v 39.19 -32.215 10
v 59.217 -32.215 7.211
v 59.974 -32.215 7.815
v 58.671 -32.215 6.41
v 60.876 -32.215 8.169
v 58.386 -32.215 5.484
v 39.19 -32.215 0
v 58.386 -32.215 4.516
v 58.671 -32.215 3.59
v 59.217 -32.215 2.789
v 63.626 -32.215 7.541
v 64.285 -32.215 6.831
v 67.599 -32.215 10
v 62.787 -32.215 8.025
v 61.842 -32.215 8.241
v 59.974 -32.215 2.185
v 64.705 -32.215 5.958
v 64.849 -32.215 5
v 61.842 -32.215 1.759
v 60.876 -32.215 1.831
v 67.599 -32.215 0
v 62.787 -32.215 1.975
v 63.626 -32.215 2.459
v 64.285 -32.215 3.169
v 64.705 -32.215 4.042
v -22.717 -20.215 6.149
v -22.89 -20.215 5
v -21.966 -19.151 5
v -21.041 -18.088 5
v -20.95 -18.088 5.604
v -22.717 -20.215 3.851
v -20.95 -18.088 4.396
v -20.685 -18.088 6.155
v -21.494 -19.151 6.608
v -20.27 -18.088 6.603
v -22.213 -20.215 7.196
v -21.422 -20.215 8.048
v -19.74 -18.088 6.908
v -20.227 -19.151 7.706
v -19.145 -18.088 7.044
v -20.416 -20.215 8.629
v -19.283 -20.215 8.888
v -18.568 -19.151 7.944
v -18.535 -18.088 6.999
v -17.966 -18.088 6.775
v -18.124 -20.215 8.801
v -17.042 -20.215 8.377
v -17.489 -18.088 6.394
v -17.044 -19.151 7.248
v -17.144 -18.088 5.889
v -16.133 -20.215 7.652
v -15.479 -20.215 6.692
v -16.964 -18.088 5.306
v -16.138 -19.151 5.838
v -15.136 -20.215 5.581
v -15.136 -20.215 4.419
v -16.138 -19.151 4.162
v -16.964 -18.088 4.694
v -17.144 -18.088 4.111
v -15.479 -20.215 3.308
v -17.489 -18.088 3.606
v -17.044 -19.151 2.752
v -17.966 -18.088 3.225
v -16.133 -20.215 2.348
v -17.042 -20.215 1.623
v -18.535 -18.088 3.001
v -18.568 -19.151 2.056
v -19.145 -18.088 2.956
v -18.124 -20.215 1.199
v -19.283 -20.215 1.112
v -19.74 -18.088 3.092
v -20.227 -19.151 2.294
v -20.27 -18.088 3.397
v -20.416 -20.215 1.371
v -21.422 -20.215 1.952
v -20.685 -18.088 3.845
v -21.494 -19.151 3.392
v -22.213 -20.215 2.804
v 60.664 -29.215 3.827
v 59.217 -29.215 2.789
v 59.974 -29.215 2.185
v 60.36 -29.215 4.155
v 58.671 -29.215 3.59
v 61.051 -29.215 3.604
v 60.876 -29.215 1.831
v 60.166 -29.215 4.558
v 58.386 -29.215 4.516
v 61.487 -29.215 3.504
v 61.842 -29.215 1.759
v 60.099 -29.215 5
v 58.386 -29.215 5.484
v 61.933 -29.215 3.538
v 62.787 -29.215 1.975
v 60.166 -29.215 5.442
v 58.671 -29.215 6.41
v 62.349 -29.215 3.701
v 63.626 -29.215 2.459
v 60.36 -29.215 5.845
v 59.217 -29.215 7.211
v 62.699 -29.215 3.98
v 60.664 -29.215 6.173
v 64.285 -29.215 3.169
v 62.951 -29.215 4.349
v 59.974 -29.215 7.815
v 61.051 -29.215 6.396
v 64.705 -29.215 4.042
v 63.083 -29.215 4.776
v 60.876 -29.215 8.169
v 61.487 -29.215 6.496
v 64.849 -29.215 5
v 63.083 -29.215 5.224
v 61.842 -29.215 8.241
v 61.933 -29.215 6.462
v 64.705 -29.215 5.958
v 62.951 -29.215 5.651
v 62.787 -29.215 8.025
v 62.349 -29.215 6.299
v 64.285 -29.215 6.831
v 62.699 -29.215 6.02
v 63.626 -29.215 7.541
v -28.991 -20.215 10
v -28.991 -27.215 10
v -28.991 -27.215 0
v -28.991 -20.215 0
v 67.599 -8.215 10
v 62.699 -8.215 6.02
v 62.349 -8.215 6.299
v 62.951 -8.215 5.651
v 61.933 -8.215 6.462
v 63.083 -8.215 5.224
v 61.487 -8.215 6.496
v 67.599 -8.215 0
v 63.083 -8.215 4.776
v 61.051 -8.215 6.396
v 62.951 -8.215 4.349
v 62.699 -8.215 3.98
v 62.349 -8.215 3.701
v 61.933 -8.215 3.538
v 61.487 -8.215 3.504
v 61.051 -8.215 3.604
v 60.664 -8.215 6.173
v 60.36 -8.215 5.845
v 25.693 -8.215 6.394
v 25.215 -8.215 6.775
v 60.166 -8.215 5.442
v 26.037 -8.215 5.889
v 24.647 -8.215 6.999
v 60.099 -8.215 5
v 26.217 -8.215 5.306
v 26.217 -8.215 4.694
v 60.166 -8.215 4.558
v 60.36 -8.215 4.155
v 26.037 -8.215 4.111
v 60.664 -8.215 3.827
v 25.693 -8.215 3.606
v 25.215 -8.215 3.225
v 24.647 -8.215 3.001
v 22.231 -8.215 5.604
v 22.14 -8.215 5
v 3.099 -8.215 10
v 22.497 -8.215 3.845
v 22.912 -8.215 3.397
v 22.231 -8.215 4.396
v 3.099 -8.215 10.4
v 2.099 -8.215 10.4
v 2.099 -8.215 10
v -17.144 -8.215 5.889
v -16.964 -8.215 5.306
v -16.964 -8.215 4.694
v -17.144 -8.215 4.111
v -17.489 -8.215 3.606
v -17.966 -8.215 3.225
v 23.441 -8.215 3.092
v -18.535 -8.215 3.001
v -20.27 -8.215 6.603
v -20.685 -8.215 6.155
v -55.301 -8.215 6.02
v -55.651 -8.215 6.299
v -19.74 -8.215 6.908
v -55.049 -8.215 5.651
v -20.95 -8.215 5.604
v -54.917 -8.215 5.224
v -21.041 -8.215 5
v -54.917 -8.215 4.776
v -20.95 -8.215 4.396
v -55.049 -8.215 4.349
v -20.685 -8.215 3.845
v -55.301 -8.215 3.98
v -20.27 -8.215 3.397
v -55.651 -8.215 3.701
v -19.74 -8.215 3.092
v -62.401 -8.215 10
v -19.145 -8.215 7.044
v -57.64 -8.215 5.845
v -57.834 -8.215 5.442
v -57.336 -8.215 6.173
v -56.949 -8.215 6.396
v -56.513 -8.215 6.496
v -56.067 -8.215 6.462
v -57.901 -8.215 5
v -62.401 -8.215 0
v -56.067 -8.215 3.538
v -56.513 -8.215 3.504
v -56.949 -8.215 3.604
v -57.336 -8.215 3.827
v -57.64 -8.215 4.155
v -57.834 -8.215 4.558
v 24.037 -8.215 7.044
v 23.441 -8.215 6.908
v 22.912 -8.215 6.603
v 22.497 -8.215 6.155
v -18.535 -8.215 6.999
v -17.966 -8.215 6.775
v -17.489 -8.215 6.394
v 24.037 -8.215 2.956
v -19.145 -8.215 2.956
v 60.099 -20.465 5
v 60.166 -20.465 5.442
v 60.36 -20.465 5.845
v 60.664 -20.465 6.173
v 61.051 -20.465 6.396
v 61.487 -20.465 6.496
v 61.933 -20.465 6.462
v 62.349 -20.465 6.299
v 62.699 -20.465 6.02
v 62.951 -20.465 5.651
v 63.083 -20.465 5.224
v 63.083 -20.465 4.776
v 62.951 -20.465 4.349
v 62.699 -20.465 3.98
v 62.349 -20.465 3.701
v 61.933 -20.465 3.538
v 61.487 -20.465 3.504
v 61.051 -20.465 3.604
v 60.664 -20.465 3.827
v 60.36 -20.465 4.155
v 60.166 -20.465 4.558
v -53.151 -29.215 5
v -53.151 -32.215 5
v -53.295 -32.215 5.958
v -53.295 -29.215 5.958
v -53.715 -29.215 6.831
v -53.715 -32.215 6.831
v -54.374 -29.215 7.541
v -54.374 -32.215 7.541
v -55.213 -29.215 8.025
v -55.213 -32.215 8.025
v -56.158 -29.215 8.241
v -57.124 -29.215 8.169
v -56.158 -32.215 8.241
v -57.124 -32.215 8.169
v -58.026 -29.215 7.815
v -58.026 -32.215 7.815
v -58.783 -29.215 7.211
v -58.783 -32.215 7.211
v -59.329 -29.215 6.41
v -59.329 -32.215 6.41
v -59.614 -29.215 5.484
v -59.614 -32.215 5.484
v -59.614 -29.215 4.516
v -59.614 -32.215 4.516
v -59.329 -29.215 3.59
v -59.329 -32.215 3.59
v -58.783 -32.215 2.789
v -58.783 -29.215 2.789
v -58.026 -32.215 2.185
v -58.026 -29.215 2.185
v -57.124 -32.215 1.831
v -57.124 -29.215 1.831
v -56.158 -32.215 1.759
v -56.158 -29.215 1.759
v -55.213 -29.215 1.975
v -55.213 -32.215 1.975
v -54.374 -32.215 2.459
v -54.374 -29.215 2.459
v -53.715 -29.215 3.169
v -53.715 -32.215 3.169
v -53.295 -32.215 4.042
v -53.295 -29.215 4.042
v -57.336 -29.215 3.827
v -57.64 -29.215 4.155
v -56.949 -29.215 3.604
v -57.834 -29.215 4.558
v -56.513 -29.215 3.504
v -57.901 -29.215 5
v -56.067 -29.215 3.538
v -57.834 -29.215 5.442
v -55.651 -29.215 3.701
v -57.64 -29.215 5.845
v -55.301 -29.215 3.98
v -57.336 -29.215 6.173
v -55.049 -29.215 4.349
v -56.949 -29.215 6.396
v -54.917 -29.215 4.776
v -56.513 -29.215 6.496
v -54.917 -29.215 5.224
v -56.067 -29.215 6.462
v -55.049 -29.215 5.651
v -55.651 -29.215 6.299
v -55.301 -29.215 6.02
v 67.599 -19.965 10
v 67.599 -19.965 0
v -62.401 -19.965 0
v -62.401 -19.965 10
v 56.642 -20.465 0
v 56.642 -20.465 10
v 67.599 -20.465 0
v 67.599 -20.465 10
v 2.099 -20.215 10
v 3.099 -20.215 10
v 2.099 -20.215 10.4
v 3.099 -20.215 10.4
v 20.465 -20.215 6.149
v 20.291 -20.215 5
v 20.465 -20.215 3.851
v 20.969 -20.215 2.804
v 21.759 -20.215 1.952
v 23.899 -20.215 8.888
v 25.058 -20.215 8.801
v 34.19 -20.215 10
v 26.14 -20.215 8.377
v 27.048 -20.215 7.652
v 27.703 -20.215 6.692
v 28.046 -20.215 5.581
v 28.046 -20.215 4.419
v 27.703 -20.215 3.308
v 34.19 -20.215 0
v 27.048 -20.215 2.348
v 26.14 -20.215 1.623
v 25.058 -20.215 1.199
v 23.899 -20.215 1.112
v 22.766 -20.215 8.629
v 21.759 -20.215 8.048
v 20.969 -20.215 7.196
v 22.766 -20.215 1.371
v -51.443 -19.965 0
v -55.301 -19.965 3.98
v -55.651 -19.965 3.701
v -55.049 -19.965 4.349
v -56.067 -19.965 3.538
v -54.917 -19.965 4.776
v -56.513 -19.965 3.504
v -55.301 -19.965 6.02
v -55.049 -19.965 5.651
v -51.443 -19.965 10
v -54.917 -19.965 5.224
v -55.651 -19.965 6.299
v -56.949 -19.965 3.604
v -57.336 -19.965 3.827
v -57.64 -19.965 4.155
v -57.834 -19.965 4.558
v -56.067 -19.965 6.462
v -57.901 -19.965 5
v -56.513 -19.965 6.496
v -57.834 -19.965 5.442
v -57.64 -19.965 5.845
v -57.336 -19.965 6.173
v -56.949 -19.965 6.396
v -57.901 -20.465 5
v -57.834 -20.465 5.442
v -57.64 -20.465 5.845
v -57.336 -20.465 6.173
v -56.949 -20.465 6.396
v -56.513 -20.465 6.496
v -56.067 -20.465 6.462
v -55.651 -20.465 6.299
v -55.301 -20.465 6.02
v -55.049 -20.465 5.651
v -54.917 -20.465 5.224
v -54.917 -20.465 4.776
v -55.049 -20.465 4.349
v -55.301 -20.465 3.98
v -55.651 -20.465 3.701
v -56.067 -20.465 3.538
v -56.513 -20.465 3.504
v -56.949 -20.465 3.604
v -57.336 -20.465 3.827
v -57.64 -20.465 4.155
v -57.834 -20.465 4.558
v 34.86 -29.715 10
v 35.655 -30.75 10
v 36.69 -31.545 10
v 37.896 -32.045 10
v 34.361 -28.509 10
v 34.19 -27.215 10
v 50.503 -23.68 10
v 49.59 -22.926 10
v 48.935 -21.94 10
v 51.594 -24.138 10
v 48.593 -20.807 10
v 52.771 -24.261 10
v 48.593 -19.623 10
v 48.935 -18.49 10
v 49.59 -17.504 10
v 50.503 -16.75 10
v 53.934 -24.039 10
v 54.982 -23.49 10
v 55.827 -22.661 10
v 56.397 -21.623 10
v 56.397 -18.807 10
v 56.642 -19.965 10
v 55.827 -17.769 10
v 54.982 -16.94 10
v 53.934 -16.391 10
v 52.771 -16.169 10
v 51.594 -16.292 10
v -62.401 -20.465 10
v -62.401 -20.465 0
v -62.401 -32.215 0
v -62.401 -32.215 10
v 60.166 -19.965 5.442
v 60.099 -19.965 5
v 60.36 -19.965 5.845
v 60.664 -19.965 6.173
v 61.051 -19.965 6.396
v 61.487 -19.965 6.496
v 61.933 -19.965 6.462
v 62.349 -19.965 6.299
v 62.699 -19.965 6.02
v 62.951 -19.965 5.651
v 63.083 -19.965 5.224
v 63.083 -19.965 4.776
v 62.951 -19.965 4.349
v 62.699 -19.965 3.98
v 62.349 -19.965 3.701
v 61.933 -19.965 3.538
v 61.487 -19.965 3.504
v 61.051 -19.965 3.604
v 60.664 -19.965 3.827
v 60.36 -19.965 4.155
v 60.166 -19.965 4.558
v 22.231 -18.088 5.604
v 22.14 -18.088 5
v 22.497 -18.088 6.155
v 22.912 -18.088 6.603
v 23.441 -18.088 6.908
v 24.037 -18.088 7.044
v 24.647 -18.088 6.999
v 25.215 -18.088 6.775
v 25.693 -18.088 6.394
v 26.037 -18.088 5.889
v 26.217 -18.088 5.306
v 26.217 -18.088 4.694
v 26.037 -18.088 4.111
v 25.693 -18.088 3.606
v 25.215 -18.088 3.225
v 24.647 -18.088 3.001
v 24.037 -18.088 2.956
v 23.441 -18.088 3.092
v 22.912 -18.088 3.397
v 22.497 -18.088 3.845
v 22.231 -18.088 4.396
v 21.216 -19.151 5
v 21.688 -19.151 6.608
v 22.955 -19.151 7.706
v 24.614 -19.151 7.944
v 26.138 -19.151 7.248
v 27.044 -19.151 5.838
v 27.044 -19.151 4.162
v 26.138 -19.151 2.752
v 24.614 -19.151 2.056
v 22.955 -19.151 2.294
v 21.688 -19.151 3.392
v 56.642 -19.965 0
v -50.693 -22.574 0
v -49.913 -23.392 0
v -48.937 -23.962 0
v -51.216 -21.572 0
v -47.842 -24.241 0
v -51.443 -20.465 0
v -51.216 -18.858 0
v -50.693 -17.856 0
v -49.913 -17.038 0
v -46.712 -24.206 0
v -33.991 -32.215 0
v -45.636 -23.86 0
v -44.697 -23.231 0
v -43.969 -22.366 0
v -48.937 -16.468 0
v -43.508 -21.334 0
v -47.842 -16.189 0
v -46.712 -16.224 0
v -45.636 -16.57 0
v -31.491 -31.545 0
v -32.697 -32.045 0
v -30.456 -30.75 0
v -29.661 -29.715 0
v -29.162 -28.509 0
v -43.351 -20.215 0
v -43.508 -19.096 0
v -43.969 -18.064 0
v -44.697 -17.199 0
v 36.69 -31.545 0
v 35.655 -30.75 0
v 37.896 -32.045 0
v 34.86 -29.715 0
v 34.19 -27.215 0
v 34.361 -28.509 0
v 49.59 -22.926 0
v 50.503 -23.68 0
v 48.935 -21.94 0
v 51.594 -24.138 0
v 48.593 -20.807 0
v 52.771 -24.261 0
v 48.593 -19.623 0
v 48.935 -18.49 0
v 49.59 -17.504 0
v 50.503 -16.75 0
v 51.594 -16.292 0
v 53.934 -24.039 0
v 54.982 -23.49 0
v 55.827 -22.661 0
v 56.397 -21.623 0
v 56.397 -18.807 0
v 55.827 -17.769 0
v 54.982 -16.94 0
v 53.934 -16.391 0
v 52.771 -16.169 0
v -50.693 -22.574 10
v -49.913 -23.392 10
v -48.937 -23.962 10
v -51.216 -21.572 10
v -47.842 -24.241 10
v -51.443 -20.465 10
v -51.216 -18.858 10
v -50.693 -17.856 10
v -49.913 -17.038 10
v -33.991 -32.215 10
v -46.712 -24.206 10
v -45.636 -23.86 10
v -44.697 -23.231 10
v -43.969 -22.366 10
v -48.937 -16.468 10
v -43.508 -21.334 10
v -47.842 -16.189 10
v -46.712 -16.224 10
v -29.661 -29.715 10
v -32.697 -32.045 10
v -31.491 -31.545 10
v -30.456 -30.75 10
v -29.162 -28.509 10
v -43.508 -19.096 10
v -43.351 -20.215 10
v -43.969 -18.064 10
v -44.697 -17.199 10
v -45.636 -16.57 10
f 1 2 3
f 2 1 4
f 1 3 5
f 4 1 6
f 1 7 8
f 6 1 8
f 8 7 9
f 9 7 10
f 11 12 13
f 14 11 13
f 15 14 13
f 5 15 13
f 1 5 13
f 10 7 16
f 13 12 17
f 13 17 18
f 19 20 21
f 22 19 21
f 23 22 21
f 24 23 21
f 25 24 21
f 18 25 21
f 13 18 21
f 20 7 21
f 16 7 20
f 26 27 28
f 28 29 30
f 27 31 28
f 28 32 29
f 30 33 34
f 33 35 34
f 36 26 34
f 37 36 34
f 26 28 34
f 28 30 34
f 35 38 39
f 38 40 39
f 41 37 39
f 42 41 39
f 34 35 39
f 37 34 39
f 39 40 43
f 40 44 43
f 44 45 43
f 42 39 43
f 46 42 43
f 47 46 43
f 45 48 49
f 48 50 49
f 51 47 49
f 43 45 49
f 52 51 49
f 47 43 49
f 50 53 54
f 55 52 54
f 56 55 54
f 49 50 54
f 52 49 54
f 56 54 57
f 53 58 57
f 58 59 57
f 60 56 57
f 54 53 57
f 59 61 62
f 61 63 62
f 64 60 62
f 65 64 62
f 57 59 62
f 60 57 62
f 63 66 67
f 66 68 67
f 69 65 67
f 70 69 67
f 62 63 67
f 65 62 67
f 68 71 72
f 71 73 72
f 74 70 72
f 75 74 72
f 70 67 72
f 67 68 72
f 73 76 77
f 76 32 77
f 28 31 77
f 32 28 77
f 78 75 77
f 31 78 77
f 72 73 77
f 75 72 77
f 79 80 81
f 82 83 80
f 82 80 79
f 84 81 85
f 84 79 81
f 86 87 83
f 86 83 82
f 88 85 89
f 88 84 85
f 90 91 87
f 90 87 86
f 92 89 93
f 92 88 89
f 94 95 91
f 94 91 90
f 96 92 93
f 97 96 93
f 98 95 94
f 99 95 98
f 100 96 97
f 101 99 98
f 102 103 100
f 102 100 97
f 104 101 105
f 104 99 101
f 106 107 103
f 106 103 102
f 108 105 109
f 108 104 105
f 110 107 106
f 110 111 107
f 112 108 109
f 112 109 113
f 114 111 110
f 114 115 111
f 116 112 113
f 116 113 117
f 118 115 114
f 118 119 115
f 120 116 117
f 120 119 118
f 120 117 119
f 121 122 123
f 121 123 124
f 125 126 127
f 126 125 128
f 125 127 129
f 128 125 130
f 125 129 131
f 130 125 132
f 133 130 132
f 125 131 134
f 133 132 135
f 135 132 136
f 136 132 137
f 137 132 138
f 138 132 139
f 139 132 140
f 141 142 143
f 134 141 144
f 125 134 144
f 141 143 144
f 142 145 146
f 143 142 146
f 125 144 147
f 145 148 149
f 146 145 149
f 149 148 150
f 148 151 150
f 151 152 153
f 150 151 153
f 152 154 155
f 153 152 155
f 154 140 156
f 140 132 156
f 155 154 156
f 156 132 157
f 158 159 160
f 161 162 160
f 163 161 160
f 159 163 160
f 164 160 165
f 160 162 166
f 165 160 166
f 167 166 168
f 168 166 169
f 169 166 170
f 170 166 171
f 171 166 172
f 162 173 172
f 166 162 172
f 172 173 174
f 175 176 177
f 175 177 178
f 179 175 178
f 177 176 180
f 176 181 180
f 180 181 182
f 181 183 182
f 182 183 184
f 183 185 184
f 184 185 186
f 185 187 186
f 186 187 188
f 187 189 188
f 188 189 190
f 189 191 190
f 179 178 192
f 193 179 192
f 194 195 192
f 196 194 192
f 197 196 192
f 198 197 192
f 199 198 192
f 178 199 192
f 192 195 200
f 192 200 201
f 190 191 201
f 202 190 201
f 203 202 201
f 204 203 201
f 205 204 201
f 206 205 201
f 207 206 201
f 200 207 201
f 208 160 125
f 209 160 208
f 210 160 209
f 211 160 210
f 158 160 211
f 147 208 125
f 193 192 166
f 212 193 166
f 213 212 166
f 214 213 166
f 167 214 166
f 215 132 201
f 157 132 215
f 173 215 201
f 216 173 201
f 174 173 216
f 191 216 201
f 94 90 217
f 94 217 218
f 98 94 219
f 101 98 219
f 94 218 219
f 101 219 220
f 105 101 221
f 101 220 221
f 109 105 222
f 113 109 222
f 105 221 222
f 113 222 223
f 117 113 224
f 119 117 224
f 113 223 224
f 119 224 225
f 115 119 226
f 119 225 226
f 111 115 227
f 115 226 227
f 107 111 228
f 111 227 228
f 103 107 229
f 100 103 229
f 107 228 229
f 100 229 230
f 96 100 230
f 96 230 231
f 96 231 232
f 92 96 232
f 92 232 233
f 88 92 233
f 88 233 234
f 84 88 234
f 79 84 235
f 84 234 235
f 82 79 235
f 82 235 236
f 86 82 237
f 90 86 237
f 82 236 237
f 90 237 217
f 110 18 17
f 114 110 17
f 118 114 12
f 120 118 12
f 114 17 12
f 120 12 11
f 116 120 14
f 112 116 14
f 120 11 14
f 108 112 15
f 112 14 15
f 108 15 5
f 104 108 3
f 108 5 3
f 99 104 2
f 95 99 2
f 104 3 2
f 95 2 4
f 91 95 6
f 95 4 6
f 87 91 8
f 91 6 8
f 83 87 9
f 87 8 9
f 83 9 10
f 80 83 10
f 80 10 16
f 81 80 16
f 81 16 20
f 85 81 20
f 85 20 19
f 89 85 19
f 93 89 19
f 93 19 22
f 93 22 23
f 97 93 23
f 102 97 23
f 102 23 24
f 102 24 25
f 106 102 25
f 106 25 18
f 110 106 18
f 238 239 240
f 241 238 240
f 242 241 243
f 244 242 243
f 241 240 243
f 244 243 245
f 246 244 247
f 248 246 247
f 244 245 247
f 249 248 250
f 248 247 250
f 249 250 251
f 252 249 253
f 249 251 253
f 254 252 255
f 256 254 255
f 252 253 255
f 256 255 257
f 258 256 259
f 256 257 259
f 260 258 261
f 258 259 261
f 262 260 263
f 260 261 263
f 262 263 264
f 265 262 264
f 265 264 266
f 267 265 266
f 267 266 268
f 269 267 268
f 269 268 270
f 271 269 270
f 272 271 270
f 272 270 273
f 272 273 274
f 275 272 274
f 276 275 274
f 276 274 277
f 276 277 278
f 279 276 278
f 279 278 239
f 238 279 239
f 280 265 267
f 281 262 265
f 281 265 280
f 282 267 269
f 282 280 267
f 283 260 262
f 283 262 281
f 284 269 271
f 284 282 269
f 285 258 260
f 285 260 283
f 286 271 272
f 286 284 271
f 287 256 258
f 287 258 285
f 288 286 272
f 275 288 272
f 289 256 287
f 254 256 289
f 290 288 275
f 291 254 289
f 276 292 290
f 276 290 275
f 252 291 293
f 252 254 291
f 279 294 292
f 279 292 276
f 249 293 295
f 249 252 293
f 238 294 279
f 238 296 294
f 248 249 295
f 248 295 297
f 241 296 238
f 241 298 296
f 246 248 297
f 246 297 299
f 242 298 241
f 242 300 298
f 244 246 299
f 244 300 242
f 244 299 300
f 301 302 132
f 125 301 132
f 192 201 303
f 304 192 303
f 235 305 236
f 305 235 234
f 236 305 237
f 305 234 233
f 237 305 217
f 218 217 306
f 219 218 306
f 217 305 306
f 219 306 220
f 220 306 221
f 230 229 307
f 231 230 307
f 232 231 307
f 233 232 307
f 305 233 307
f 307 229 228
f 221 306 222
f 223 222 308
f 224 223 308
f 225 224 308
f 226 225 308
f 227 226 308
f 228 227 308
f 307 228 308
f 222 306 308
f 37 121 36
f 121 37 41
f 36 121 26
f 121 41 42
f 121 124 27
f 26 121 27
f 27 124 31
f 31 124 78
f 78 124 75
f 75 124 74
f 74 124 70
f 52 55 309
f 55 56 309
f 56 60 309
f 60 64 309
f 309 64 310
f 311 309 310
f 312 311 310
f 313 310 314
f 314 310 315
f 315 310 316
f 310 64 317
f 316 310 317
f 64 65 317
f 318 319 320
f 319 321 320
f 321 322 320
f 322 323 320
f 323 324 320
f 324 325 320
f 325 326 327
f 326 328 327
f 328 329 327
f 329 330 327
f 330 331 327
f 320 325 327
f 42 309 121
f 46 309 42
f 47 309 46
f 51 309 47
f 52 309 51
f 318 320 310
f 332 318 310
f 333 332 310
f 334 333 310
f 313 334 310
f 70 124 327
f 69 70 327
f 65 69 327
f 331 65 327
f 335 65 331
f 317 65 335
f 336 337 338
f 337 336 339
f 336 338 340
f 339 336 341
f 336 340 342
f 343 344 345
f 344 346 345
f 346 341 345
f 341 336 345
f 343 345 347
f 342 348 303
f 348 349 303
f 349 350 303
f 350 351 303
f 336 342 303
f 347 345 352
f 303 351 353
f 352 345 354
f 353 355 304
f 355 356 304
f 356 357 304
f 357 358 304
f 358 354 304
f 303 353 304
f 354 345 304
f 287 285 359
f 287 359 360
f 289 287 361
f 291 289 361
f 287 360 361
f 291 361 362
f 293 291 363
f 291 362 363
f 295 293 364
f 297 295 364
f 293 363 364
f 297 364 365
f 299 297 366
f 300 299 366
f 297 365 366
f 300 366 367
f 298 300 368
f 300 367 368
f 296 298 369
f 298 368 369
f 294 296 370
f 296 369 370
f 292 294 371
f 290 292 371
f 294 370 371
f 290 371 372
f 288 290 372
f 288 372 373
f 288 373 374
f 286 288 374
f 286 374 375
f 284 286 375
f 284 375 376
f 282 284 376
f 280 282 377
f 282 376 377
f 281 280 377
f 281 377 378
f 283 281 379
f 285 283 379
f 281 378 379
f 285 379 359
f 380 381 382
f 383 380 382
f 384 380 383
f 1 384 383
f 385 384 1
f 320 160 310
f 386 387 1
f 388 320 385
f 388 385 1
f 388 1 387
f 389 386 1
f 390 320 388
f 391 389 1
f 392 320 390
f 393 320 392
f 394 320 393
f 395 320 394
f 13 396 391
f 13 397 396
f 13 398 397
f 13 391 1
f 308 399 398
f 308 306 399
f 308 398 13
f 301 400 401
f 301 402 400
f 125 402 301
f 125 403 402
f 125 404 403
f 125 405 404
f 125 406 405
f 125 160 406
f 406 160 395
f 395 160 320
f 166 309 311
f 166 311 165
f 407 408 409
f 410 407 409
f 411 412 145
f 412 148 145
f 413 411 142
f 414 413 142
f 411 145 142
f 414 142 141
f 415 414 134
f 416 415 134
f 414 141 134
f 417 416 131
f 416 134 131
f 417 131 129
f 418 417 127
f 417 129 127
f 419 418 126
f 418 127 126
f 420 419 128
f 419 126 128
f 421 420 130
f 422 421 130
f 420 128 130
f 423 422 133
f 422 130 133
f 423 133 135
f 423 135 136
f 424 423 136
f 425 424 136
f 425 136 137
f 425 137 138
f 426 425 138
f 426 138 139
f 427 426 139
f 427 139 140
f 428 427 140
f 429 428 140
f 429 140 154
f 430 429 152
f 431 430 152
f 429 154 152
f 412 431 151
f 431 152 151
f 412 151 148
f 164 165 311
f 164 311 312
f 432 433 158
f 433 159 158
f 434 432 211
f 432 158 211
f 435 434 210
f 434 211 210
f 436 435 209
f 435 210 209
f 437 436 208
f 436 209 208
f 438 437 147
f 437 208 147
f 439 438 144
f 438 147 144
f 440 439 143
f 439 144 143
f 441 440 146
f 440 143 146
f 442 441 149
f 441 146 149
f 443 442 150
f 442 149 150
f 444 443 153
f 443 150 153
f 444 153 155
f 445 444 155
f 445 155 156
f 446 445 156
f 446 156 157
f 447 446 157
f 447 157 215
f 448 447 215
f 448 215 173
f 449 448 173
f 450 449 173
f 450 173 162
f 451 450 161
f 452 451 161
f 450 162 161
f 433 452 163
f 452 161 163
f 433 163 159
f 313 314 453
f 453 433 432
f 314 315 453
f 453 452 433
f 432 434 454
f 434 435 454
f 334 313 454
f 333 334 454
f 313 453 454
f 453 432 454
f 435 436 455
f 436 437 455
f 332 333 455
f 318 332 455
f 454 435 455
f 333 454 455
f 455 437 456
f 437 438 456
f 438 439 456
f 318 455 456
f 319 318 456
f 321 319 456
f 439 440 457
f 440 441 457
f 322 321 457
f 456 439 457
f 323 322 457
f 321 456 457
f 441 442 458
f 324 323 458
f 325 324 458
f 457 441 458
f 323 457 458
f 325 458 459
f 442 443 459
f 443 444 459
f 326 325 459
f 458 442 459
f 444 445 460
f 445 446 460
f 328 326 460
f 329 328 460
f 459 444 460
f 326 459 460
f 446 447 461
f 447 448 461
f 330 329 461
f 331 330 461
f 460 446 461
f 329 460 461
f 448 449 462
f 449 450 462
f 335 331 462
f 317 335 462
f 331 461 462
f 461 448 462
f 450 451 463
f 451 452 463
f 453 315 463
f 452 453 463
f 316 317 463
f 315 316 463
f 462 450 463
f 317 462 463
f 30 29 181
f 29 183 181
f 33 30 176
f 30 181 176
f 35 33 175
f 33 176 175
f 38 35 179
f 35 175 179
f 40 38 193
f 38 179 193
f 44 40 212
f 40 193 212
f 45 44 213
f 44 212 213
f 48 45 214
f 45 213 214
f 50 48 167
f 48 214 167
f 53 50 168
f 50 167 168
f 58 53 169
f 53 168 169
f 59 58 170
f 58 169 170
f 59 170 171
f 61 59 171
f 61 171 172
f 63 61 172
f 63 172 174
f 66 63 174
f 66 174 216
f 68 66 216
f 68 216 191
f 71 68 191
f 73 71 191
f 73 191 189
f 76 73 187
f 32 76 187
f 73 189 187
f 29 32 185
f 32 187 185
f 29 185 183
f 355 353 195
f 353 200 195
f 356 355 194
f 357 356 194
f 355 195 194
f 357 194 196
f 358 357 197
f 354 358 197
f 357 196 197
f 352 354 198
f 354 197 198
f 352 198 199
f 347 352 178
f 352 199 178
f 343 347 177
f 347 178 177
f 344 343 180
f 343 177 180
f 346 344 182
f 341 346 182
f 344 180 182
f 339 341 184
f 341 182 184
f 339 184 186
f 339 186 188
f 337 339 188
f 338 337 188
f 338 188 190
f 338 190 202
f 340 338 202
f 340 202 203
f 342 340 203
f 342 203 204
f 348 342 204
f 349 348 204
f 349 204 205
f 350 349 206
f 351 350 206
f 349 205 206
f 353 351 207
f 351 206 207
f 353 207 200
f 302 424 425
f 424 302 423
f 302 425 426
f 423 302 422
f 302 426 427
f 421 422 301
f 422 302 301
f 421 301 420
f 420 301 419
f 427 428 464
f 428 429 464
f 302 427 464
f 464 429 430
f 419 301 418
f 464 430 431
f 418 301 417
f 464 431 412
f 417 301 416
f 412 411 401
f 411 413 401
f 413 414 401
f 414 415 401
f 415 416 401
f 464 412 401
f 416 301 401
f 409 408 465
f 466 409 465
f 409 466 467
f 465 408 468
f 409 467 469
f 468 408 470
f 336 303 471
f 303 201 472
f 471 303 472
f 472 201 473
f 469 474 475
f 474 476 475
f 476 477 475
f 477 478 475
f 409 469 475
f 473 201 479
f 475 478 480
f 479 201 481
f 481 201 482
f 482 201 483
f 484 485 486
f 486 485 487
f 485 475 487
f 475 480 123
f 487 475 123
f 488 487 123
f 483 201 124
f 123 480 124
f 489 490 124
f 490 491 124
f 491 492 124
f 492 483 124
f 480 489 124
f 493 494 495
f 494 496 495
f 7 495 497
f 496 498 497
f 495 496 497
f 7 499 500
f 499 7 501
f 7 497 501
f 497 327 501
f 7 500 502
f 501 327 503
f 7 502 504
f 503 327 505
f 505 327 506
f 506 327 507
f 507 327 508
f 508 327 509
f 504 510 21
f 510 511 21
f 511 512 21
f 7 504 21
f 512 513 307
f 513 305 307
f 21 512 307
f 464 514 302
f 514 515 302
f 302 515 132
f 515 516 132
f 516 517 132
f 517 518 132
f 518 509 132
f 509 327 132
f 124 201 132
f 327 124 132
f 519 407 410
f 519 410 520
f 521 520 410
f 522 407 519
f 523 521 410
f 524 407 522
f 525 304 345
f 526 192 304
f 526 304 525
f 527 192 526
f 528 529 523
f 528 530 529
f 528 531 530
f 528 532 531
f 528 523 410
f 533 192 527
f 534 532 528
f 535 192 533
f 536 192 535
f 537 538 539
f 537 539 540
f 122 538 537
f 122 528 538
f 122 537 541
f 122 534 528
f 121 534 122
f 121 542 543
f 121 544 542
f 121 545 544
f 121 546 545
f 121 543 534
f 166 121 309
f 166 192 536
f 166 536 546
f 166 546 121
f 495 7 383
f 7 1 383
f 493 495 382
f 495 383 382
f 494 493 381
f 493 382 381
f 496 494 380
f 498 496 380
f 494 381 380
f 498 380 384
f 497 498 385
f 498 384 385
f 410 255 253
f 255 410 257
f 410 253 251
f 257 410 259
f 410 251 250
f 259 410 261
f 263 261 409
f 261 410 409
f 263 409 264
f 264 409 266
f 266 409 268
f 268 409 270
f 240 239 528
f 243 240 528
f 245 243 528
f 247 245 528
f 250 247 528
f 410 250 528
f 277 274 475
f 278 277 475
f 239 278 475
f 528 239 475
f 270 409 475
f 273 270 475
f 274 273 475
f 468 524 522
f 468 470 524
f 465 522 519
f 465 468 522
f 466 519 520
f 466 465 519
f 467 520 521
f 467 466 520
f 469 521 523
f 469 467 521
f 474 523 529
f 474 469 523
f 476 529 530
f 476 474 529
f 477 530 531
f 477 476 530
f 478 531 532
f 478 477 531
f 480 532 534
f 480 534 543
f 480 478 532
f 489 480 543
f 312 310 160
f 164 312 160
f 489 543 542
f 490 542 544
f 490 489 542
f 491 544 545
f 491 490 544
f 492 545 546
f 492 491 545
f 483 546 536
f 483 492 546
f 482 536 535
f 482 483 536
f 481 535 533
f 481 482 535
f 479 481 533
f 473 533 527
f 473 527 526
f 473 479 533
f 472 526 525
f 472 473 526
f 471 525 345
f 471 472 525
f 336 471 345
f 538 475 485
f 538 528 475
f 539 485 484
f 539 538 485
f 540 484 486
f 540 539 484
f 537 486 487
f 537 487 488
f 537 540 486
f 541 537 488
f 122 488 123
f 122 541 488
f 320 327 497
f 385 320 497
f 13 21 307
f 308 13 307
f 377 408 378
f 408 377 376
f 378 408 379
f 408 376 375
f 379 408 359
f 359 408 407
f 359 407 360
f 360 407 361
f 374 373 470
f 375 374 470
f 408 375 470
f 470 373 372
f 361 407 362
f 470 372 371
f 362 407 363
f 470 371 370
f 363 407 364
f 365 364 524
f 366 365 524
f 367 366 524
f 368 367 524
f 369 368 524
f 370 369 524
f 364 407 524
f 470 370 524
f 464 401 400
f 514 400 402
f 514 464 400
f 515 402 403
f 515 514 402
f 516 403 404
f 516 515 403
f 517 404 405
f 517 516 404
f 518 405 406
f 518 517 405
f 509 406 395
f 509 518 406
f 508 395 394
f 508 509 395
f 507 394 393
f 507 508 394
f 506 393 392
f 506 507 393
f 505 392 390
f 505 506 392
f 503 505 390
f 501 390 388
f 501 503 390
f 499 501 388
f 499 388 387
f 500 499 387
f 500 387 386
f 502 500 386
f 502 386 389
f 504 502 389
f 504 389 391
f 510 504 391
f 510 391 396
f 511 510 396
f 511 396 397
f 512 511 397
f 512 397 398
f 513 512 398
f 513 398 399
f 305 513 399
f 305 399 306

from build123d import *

# Parameters (mm, degrees)
F0_R            = 4.05
F1_DEPTH        = 10
F2_R            = 5
F4_D            = 4.1000000042
F4_CSINK_D      = 7.7978
F4_CSINK_ANGLE  = 82
F5_W            = 1
F5_H            = 12
F6_DEPTH        = 0.4
F8_DEPTH        = 25
F10_D           = 3
F10_CBORE_D     = 6.5
F10_CBORE_DEPTH = 3


with BuildPart() as f1:
    # F0 (on Top) → F1 (new body)
    with BuildSketch(Plane.XY):
        Polygon((67.5994434953, -8.2149432153), (-62.4005565047, -8.2149432153), (-62.4005565047, -32.2149432153), (-28.9914757013, -32.2149432153), (-28.9914757013, -20.2149432153), (34.1903626919, -20.2149432153), (34.1903626919, -32.2149432153), (67.5994434953, -32.2149432153), align=None)
        with Locations((-47.4005565047, -20.2149432153)):
            Circle(F0_R, mode=Mode.SUBTRACT)
        with Locations((52.5994434953, -20.2149432153)):
            Circle(F0_R, mode=Mode.SUBTRACT)
    extrude(amount=F1_DEPTH)

    # F2
    f2_edges = [f1.edges().sort_by_distance(p)[0] for p in [
        (34.190363, -32.214943, 5),
        (-28.991476, -32.214943, 5),
    ]]
    fillet(f2_edges, radius=F2_R)

    # F4 (through all)
    with Locations(Plane.XZ.offset(20.2149432153)):
        with Locations((-18.9914757013, 5), (24.1903626919, 5)):
            CounterSinkHole(F4_D / 2, F4_CSINK_D / 2, counter_sink_angle=F4_CSINK_ANGLE)

    # F5 (on face) → F6 (join)
    with BuildSketch(Plane.XY.offset(10)):
        with Locations((2.5994434953, -14.2149432153)):
            Rectangle(F5_W, F5_H)
    extrude(amount=F6_DEPTH)

    # F7 (on face) → F8 (cut)
    with BuildSketch(Plane.XY.offset(10)):
        with BuildLine():
            ThreePointArc((56.6417200816, -19.9649432153), (56.6475121814, -20.0898835784), (56.6494434953, -20.2149432153))
            ThreePointArc((56.6494434953, -20.2149432153), (56.6475121814, -20.3400028521), (56.6417200816, -20.4649432153))
            Line((56.6417200816, -20.4649432153), (67.5994434953, -20.4649432153))
            Line((67.5994434953, -20.4649432153), (67.5994434953, -19.9649432153))
            Line((67.5994434953, -19.9649432153), (56.6417200816, -19.9649432153))
        make_face()
        with BuildLine():
            Line((-51.442833091, -19.9649432153), (-62.4005565047, -19.9649432153))
            Line((-62.4005565047, -19.9649432153), (-62.4005565047, -20.4649432153))
            Line((-62.4005565047, -20.4649432153), (-51.442833091, -20.4649432153))
            ThreePointArc((-51.442833091, -20.4649432153), (-51.4505565047, -20.2149432153), (-51.442833091, -19.9649432153))
        make_face()
        with BuildLine():
            Line((-51.442833091, -20.4649432153), (-51.442833091, -19.9649432153))
            ThreePointArc((-51.442833091, -19.9649432153), (-51.4505565047, -20.2149432153), (-51.442833091, -20.4649432153))
        make_face()
        with BuildLine():
            ThreePointArc((56.6417200816, -20.4649432153), (56.6475121814, -20.3400028521), (56.6494434953, -20.2149432153))
            ThreePointArc((56.6494434953, -20.2149432153), (56.6475121814, -20.0898835784), (56.6417200816, -19.9649432153))
            Line((56.6417200816, -19.9649432153), (56.6417200816, -20.4649432153))
        make_face()
    extrude(amount=-F8_DEPTH, mode=Mode.SUBTRACT)

    # F10 (through all)
    with Locations(Plane.XZ.offset(32.2149432153)):
        with Locations((61.5994434953, 5), (-56.4005565047, 5)):
            CounterBoreHole(F10_D / 2, F10_CBORE_D / 2, F10_CBORE_DEPTH)


solid = f1.part
